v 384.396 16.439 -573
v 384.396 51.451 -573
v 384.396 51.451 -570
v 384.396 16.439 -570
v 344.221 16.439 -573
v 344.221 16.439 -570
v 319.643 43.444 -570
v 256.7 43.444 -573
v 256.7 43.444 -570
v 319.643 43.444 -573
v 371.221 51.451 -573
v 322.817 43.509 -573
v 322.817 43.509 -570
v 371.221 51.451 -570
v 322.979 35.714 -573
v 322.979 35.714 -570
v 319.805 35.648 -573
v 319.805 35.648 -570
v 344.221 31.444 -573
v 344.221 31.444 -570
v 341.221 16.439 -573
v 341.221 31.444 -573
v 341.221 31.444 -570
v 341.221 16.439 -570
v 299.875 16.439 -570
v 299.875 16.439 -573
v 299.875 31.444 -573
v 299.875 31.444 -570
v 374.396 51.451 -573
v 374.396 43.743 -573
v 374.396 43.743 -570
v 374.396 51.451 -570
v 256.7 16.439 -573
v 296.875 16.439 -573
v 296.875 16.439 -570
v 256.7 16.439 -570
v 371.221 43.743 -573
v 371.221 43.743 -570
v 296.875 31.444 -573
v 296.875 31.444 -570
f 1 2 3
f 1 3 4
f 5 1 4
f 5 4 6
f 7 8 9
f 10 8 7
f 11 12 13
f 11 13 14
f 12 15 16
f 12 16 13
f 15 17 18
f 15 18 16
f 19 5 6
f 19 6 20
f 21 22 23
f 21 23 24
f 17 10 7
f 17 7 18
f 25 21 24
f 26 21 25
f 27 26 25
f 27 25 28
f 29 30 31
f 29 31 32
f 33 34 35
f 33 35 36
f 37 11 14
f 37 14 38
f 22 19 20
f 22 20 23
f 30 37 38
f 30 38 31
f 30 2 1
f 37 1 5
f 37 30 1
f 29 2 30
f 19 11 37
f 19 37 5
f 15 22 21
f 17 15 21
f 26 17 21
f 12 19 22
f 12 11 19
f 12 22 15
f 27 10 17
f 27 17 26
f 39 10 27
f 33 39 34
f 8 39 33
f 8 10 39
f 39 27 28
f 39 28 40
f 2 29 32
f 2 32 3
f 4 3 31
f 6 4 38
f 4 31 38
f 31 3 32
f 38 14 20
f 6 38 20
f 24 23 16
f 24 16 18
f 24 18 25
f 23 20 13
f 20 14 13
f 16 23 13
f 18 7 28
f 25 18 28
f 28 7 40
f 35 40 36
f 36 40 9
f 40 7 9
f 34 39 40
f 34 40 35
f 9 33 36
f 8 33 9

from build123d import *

# Parameters (mm, degrees)
BOSS_EXTRUDE1_DEPTH = 3


with BuildPart() as part:
    # Sketch1 → Boss-Extrude1 (new body)
    with BuildSketch(Plane.XY.offset(-573)):
        Polygon((371.221, 43.742761671), (374.396, 43.742761671), (374.396, 51.45098076), (384.396, 51.45098076), (384.396, 16.438825445), (344.221, 16.438825445), (344.221, 31.443621916), (341.221, 31.443621916), (341.221, 16.438825445), (299.875, 16.438825445), (299.875, 31.443621916), (296.875, 31.443621916), (296.875, 16.438825445), (256.7, 16.438825445), (256.7, 43.443621916), (319.643036314, 43.443621916), (319.80460348, 35.648311515), (322.978935298, 35.713515129), (322.817368061, 43.508828946), (371.221, 51.450981405), align=None)
    extrude(amount=BOSS_EXTRUDE1_DEPTH)


solid = part.part
